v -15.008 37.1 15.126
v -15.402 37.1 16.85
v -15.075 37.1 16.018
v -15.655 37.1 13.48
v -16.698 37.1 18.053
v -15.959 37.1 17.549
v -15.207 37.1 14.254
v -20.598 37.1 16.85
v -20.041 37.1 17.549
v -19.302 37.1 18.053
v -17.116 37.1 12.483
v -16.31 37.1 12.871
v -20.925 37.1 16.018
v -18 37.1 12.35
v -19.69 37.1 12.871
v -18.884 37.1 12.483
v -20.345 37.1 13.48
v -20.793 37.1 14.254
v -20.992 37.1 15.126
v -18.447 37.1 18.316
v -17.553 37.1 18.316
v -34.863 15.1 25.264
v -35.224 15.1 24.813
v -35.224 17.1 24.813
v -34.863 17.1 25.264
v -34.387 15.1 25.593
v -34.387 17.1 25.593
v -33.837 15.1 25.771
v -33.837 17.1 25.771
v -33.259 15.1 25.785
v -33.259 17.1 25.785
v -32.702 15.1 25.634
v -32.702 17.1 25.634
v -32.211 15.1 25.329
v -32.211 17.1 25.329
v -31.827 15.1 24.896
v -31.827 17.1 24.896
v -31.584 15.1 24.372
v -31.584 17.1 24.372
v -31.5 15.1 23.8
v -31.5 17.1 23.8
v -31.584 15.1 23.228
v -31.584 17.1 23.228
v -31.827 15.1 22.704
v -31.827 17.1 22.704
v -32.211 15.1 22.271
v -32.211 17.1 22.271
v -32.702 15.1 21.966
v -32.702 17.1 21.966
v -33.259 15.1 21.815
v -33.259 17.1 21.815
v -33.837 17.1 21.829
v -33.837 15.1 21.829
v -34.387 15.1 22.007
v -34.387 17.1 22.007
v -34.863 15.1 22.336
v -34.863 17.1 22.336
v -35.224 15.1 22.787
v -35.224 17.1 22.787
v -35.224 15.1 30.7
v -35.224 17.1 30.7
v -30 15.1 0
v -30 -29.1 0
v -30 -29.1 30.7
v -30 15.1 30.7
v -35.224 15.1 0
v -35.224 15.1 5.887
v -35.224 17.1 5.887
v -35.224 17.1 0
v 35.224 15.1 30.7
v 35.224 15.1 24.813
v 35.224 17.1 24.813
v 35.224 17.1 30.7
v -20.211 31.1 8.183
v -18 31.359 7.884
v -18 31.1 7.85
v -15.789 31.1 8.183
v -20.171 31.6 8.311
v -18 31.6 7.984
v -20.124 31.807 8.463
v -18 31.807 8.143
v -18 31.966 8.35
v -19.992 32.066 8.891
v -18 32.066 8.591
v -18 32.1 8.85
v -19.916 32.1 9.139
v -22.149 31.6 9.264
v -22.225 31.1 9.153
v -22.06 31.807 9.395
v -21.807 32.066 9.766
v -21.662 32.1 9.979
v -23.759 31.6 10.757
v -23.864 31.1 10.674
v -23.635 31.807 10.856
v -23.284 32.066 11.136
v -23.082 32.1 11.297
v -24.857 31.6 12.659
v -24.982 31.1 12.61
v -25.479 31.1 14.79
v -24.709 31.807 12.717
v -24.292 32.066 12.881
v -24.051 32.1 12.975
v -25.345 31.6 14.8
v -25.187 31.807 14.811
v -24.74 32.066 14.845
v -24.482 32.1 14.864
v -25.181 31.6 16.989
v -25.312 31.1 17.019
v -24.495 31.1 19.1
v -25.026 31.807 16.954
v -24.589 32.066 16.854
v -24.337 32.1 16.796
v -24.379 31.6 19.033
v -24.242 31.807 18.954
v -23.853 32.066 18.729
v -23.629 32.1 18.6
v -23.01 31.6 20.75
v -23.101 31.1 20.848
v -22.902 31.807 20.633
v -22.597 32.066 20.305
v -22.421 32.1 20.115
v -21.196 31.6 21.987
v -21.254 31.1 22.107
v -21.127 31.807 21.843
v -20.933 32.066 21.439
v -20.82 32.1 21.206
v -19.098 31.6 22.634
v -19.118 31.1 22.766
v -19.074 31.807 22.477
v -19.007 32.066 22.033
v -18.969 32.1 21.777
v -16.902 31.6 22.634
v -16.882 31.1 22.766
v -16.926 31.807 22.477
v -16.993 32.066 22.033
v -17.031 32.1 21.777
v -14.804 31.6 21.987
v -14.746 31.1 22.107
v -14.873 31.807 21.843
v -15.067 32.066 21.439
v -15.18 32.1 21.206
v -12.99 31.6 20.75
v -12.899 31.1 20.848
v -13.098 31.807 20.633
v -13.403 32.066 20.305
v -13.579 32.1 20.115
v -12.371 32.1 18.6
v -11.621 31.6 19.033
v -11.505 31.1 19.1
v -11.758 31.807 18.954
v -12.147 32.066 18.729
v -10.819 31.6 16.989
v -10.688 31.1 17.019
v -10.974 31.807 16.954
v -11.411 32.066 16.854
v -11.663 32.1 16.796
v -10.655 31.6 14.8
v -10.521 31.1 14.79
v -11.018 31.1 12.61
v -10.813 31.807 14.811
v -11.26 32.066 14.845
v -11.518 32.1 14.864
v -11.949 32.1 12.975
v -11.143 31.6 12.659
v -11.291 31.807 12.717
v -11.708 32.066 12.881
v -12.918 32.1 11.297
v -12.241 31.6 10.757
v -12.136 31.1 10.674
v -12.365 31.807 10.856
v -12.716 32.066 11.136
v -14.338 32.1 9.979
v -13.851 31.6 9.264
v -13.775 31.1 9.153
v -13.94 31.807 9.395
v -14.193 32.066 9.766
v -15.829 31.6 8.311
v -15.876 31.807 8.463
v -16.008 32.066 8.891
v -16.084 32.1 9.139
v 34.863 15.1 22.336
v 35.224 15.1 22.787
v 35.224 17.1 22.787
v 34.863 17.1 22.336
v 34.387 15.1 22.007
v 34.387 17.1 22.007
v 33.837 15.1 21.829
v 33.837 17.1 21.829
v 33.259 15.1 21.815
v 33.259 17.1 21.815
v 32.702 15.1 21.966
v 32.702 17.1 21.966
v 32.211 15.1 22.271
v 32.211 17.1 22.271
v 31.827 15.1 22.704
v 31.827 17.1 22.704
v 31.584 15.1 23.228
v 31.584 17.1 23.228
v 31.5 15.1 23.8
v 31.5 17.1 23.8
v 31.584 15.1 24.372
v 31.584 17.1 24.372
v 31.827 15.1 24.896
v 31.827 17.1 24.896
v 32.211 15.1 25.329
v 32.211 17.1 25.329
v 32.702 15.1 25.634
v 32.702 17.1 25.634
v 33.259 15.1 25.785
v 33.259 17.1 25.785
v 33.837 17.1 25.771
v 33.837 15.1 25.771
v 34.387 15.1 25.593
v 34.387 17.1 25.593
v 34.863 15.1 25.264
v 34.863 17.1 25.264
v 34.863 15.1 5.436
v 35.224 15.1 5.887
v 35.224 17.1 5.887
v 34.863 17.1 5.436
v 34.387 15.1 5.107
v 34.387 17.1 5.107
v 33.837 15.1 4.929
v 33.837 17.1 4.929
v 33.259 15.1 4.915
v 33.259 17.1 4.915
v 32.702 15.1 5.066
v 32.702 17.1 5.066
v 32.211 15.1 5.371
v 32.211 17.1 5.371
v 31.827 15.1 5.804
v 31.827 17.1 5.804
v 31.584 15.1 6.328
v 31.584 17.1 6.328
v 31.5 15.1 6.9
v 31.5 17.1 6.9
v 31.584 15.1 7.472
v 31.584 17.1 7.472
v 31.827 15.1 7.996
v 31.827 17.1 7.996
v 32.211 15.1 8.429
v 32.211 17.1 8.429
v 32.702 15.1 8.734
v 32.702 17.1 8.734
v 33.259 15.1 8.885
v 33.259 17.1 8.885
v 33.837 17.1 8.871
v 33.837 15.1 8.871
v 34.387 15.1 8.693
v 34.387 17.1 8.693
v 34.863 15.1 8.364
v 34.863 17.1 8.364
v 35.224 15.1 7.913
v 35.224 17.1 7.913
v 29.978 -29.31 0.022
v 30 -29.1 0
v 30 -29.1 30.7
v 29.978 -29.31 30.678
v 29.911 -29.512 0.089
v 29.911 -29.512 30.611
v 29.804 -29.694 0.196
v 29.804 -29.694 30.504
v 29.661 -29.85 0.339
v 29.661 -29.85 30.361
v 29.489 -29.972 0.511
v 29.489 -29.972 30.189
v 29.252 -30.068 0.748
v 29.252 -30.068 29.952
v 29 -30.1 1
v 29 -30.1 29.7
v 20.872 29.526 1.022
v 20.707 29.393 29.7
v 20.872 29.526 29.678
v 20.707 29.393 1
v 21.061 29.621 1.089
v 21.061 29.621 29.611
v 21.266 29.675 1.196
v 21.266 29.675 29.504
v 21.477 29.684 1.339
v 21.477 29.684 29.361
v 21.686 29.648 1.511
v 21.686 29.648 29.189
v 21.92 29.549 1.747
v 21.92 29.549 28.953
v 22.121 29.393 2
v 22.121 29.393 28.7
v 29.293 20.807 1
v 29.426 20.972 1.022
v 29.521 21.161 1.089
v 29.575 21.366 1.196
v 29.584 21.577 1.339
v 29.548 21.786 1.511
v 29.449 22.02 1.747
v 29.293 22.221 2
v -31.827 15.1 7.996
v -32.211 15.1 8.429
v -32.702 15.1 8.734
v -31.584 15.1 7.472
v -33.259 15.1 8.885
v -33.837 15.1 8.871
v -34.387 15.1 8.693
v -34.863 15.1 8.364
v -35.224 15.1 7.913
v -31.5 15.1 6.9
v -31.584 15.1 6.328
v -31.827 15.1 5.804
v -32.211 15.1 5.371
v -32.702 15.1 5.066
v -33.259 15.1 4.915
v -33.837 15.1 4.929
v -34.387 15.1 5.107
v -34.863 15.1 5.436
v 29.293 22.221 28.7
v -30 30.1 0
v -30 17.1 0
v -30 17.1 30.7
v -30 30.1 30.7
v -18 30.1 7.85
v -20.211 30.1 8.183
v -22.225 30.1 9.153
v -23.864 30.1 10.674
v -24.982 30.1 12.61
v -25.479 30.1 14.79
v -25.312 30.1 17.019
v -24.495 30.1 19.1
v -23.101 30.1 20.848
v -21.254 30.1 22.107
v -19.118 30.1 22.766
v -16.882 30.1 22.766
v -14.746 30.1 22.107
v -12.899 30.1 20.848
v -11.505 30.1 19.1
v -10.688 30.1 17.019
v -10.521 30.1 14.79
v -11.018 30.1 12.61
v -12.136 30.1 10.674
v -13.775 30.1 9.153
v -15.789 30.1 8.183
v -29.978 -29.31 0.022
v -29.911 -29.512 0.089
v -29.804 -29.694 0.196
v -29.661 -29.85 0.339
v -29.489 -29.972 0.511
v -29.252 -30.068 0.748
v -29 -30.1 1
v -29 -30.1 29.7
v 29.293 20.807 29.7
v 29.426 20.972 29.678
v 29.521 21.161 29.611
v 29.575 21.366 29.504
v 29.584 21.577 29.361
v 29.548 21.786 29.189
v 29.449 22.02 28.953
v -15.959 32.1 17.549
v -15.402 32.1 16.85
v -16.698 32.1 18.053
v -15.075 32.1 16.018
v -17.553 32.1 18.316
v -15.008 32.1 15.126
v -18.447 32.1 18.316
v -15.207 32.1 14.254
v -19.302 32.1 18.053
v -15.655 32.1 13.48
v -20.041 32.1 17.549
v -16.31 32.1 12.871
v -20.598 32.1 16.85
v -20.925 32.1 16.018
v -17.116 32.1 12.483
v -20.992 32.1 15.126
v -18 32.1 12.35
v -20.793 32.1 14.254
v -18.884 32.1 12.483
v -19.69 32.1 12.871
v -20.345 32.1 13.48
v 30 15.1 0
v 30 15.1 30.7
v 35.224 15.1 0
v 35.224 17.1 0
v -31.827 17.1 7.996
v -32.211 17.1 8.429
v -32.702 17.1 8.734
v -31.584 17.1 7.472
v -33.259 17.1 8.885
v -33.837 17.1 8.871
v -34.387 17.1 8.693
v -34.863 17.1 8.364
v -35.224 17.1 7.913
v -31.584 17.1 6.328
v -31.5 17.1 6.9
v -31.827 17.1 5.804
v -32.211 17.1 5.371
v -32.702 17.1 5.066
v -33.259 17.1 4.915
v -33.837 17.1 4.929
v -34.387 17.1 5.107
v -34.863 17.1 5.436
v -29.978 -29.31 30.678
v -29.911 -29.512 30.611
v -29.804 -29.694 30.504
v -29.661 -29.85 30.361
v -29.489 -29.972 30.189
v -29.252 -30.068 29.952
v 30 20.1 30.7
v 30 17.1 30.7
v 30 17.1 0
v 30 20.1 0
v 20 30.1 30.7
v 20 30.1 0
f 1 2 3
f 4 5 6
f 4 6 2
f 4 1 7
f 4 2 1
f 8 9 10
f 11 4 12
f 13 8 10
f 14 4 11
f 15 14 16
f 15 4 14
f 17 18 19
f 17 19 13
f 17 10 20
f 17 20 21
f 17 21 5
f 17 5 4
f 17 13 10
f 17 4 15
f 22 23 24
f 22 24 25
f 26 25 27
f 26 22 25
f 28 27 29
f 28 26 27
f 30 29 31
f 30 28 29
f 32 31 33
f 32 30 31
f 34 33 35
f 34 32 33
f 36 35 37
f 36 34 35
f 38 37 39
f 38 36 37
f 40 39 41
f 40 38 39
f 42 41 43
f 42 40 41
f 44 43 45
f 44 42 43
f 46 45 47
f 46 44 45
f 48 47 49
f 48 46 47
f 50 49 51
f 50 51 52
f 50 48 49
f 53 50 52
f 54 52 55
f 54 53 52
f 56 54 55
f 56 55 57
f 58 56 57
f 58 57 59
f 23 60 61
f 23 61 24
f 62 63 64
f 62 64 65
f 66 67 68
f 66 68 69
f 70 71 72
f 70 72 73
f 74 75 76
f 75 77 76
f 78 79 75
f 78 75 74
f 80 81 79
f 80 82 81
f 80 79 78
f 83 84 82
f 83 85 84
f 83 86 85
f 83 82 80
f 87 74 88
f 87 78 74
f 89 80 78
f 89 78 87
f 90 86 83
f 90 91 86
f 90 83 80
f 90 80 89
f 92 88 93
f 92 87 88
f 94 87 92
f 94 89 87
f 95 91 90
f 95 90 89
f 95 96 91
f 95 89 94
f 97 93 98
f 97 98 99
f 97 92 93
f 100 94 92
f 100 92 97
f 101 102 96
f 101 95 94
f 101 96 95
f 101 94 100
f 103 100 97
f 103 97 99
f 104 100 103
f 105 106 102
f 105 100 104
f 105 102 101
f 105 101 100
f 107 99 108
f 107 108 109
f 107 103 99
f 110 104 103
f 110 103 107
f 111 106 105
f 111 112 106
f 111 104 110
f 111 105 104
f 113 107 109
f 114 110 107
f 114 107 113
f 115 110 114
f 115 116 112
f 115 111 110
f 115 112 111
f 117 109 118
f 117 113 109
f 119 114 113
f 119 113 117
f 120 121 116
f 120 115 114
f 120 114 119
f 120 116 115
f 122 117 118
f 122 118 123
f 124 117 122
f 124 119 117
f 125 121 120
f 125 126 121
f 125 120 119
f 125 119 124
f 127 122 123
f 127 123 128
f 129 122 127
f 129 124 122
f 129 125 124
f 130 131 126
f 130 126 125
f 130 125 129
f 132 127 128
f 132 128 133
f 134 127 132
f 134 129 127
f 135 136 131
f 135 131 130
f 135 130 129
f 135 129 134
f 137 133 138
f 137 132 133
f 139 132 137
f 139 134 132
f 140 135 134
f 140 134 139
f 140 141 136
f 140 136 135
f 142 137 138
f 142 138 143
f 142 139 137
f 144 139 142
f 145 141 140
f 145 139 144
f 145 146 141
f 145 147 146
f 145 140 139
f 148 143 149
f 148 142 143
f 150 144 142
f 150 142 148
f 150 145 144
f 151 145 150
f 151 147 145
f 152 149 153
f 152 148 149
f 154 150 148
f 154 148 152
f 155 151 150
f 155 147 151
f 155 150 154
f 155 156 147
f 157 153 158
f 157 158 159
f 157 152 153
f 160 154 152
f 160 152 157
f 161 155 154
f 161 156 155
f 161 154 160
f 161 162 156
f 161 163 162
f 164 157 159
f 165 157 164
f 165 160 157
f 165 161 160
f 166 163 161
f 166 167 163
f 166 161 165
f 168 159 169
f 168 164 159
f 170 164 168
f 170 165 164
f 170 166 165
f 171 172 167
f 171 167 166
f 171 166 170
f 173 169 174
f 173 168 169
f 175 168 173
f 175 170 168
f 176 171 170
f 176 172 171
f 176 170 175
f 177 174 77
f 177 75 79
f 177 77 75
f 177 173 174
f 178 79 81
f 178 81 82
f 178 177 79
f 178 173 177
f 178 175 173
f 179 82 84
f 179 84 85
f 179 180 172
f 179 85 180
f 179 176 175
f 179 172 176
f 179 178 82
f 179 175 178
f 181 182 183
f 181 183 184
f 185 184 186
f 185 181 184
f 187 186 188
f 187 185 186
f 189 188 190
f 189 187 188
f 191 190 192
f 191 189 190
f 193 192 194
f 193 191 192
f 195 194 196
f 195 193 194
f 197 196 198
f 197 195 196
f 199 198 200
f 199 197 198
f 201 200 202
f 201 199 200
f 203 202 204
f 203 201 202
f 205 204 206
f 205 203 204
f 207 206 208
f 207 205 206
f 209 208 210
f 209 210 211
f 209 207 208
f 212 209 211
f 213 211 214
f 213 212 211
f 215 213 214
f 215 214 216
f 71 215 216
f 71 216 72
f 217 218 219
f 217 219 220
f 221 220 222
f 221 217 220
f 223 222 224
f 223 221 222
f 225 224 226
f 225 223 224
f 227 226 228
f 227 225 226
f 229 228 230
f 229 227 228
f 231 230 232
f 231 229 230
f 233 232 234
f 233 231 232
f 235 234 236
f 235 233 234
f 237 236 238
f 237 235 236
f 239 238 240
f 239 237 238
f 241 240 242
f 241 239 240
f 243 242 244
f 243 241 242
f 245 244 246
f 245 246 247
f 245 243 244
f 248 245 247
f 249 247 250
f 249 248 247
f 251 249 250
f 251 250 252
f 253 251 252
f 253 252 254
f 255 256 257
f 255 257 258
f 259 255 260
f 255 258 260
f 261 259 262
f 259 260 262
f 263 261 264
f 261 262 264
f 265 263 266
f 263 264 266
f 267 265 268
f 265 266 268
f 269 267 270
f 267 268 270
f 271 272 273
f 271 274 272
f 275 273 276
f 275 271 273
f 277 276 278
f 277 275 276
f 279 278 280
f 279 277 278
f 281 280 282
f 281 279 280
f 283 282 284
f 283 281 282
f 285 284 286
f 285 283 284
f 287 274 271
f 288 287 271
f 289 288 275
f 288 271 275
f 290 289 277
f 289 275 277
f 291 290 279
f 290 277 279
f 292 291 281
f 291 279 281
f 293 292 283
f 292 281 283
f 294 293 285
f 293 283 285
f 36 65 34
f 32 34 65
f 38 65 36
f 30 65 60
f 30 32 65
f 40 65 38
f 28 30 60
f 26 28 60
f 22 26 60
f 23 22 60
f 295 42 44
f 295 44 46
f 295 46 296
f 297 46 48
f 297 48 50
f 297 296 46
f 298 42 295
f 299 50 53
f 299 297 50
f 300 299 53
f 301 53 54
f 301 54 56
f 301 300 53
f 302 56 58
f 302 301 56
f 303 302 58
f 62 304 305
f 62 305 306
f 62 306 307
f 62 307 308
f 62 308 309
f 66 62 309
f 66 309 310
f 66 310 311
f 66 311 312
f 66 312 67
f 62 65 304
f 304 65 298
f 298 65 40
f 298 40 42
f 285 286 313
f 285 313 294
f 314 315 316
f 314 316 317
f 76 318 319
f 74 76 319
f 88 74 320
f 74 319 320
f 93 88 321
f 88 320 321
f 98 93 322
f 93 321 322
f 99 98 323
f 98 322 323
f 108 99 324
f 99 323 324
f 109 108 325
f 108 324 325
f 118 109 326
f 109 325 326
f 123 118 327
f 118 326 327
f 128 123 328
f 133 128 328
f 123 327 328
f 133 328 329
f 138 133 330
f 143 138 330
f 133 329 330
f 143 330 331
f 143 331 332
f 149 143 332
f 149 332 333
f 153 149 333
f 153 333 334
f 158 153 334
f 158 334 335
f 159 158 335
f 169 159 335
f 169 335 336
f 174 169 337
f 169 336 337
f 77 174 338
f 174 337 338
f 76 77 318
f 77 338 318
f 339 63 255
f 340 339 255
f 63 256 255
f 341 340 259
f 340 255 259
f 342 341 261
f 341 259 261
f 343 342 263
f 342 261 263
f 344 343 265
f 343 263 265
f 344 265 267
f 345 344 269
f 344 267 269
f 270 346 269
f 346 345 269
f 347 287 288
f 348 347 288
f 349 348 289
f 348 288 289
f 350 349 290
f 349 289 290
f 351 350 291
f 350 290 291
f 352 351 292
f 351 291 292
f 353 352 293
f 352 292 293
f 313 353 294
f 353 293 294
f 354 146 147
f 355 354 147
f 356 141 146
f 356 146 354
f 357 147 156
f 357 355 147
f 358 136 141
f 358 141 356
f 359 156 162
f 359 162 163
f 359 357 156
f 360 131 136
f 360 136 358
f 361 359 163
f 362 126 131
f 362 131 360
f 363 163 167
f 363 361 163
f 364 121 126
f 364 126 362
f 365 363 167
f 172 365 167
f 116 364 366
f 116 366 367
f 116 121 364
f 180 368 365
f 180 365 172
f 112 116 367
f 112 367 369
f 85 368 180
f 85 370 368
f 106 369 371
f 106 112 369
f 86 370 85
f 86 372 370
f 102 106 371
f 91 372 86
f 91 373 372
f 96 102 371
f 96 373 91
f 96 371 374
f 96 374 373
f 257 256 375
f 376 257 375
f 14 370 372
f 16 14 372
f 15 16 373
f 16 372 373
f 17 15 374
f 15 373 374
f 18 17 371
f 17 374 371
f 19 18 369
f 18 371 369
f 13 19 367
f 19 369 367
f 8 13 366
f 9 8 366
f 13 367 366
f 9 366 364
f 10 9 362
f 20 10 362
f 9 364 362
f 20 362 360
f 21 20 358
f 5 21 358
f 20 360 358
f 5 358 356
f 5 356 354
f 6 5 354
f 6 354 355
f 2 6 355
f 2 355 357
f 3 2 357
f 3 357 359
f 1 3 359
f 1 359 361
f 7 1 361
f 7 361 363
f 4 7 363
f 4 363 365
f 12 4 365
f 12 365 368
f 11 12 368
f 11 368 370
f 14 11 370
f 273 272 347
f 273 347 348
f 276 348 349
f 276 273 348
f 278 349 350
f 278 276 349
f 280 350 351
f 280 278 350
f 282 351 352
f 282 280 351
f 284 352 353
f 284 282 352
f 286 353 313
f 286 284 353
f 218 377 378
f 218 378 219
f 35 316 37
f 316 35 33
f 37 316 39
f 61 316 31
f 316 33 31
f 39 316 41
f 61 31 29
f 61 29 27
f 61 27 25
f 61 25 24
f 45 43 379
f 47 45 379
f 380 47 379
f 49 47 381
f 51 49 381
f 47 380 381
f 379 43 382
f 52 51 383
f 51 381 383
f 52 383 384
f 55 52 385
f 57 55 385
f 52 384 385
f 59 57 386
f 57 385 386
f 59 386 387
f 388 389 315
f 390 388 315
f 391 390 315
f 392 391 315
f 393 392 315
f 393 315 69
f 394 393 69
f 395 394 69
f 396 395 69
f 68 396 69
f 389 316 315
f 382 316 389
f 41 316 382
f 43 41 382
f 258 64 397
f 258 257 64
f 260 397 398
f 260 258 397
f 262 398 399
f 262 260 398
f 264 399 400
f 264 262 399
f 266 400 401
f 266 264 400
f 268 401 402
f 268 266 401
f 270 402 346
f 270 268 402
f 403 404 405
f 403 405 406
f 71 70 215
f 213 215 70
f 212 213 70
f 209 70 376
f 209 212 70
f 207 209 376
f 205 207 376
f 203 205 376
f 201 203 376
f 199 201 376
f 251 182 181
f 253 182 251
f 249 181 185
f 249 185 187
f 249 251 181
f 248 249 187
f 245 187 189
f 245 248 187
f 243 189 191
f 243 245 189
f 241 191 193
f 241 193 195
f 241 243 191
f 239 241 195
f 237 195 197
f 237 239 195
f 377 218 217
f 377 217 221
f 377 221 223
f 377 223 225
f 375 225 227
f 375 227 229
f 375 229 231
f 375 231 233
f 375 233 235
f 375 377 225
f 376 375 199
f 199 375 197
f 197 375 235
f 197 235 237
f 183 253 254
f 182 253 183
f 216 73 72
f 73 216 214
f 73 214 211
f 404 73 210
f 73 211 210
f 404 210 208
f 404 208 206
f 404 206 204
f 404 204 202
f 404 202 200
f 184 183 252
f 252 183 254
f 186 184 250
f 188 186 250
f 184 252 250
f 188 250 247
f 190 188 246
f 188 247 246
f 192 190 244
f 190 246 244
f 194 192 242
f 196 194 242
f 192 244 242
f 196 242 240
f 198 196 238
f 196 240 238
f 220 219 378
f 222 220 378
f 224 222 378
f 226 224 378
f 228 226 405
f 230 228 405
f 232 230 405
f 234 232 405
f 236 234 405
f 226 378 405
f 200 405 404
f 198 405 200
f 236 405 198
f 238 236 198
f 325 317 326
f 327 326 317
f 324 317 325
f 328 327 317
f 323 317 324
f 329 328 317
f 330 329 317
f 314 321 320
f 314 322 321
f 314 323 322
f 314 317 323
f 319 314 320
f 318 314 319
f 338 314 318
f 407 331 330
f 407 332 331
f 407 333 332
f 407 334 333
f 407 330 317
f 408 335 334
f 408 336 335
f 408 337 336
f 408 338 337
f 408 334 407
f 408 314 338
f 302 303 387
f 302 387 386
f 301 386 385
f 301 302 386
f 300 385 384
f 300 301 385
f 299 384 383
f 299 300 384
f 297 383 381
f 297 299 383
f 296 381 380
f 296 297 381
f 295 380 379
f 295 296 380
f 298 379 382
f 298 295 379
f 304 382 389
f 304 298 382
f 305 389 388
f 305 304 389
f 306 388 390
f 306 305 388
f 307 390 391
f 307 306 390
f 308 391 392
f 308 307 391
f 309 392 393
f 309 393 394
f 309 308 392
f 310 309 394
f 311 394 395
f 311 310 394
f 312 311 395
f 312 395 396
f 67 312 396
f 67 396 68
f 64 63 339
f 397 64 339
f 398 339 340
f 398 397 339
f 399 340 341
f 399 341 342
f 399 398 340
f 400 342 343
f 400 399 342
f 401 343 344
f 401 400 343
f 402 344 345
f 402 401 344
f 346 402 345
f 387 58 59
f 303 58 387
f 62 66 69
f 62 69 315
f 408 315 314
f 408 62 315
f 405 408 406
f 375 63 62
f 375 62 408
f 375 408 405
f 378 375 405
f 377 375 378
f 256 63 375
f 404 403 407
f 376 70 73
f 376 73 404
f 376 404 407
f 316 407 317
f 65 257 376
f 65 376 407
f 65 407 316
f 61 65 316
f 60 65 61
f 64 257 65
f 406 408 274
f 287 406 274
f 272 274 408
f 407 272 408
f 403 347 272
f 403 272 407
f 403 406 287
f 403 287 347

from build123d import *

# Parameters (mm, degrees)
SKETCH1_W           = 60
SKETCH1_H           = 60.2
BOSS_EXTRUDE1_DEPTH = 30.7
BOSS_EXTRUDE2_START = -15
BOSS_EXTRUDE2_DEPTH = 2
SKETCH3_R           = 3
BOSS_EXTRUDE3_DEPTH = 7
CHAMFER1_SIZE       = 10
SKETCH5_R           = 7.5
SKETCH5_R_2         = 3
BOSS_EXTRUDE4_DEPTH = 2
FILLET1_R           = 1
FILLET2_R           = 1
SKETCH6_W           = 28.7
SKETCH6_H           = 12.142135624
BOSS_EXTRUDE5_DEPTH = 1
FILLET3_R           = 1


with BuildPart() as part:
    # Sketch1 → Boss-Extrude1 (new body)
    with BuildSketch(Plane.XY):
        Rectangle(SKETCH1_W, SKETCH1_H)
    extrude(amount=BOSS_EXTRUDE1_DEPTH)

    # Sketch2 → Boss-Extrude2 (add)
    with BuildSketch(Plane(origin=(0, 30.1, 0), x_dir=(1, 0, 0), z_dir=(0, 1, 0)).offset(BOSS_EXTRUDE2_START)):
        with BuildLine():
            Line((-35.224448097, 0), (35.224448097, 0))
            Line((35.224448097, 0), (35.224448097, -5.886945825))
            ThreePointArc((35.224448097, -5.886945825), (31.5, -6.9), (35.224448097, -7.913054175))
            Line((35.224448097, -7.913054175), (35.224448097, -22.786945825))
            ThreePointArc((35.224448097, -22.786945825), (31.5, -23.8), (35.224448097, -24.813054175))
            Line((35.224448097, -24.813054175), (35.224448097, -30.7))
            Line((35.224448097, -30.7), (-35.224448097, -30.7))
            Line((-35.224448097, -30.7), (-35.224448097, -24.813054175))
            ThreePointArc((-35.224448097, -24.813054175), (-31.5, -23.8), (-35.224448097, -22.786945825))
            Line((-35.224448097, -22.786945825), (-35.224448097, -7.913054175))
            ThreePointArc((-35.224448097, -7.913054175), (-31.5, -6.9), (-35.224448097, -5.886945825))
            Line((-35.224448097, -5.886945825), (-35.224448097, 0))
        make_face()
    extrude(amount=BOSS_EXTRUDE2_DEPTH)

    # Sketch3 → Boss-Extrude3 (add)
    with BuildSketch(Plane(origin=(0, 30.1, 0), x_dir=(1, 0, 0), z_dir=(0, 1, 0))):
        with Locations(Location((-18, -15.35, 0), (0, 0, 90))):
            Circle(SKETCH3_R)
    extrude(amount=BOSS_EXTRUDE3_DEPTH)

    # Chamfer1
    chamfer1_edges = [part.edges().sort_by_distance(p)[0] for p in [
        (30, 30.1, 15.35),
    ]]
    chamfer(chamfer1_edges, length=CHAMFER1_SIZE)

    # Sketch5 → Boss-Extrude4 (add)
    with BuildSketch(Plane(origin=(0, 30.1, 0), x_dir=(1, 0, 0), z_dir=(0, 1, 0))):
        with Locations(Location((-18, -15.35, 0), (0, 0, 90))):
            Circle(SKETCH5_R)
        with Locations(Location((-18, -15.35, 0), (0, 0, 270))):
            Circle(SKETCH5_R_2, mode=Mode.SUBTRACT)
    extrude(amount=BOSS_EXTRUDE4_DEPTH)

    # Fillet1
    fillet1_edges = [part.edges().sort_by_distance(p)[0] for p in [
        (-18, 32.1, 22.85),
    ]]
    fillet(fillet1_edges, radius=FILLET1_R)

    # Fillet2
    fillet2_edges = [part.edges().sort_by_distance(p)[0] for p in [
        (0, -30.1, 30.7),
        (0, -30.1, 0),
        (30, -30.1, 15.35),
        (-30, -30.1, 15.35),
    ]]
    fillet(fillet2_edges, radius=FILLET2_R)

    # Sketch6 → Boss-Extrude5 (add)
    with BuildSketch(Plane(origin=(25.05, 25.05, 0), x_dir=(0, 0, -1), z_dir=(0.707106781186549, 0.707106781186546, 0))):
        with Locations((-15.35, 0.070710678)):
            Rectangle(SKETCH6_W, SKETCH6_H)
    extrude(amount=BOSS_EXTRUDE5_DEPTH)

    # Fillet3
    fillet3_edges = [part.edges().sort_by_distance(p)[0] for p in [
        (25.707106781, 25.807106781, 1),
        (30, 21.514213562, 15.35),
        (25.707106781, 25.807106781, 29.7),
        (21.414213562, 30.1, 15.35),
    ]]
    fillet(fillet3_edges, radius=FILLET3_R - 0.0001)  # a hair under: the kernel refuses the full size


solid = part.part
